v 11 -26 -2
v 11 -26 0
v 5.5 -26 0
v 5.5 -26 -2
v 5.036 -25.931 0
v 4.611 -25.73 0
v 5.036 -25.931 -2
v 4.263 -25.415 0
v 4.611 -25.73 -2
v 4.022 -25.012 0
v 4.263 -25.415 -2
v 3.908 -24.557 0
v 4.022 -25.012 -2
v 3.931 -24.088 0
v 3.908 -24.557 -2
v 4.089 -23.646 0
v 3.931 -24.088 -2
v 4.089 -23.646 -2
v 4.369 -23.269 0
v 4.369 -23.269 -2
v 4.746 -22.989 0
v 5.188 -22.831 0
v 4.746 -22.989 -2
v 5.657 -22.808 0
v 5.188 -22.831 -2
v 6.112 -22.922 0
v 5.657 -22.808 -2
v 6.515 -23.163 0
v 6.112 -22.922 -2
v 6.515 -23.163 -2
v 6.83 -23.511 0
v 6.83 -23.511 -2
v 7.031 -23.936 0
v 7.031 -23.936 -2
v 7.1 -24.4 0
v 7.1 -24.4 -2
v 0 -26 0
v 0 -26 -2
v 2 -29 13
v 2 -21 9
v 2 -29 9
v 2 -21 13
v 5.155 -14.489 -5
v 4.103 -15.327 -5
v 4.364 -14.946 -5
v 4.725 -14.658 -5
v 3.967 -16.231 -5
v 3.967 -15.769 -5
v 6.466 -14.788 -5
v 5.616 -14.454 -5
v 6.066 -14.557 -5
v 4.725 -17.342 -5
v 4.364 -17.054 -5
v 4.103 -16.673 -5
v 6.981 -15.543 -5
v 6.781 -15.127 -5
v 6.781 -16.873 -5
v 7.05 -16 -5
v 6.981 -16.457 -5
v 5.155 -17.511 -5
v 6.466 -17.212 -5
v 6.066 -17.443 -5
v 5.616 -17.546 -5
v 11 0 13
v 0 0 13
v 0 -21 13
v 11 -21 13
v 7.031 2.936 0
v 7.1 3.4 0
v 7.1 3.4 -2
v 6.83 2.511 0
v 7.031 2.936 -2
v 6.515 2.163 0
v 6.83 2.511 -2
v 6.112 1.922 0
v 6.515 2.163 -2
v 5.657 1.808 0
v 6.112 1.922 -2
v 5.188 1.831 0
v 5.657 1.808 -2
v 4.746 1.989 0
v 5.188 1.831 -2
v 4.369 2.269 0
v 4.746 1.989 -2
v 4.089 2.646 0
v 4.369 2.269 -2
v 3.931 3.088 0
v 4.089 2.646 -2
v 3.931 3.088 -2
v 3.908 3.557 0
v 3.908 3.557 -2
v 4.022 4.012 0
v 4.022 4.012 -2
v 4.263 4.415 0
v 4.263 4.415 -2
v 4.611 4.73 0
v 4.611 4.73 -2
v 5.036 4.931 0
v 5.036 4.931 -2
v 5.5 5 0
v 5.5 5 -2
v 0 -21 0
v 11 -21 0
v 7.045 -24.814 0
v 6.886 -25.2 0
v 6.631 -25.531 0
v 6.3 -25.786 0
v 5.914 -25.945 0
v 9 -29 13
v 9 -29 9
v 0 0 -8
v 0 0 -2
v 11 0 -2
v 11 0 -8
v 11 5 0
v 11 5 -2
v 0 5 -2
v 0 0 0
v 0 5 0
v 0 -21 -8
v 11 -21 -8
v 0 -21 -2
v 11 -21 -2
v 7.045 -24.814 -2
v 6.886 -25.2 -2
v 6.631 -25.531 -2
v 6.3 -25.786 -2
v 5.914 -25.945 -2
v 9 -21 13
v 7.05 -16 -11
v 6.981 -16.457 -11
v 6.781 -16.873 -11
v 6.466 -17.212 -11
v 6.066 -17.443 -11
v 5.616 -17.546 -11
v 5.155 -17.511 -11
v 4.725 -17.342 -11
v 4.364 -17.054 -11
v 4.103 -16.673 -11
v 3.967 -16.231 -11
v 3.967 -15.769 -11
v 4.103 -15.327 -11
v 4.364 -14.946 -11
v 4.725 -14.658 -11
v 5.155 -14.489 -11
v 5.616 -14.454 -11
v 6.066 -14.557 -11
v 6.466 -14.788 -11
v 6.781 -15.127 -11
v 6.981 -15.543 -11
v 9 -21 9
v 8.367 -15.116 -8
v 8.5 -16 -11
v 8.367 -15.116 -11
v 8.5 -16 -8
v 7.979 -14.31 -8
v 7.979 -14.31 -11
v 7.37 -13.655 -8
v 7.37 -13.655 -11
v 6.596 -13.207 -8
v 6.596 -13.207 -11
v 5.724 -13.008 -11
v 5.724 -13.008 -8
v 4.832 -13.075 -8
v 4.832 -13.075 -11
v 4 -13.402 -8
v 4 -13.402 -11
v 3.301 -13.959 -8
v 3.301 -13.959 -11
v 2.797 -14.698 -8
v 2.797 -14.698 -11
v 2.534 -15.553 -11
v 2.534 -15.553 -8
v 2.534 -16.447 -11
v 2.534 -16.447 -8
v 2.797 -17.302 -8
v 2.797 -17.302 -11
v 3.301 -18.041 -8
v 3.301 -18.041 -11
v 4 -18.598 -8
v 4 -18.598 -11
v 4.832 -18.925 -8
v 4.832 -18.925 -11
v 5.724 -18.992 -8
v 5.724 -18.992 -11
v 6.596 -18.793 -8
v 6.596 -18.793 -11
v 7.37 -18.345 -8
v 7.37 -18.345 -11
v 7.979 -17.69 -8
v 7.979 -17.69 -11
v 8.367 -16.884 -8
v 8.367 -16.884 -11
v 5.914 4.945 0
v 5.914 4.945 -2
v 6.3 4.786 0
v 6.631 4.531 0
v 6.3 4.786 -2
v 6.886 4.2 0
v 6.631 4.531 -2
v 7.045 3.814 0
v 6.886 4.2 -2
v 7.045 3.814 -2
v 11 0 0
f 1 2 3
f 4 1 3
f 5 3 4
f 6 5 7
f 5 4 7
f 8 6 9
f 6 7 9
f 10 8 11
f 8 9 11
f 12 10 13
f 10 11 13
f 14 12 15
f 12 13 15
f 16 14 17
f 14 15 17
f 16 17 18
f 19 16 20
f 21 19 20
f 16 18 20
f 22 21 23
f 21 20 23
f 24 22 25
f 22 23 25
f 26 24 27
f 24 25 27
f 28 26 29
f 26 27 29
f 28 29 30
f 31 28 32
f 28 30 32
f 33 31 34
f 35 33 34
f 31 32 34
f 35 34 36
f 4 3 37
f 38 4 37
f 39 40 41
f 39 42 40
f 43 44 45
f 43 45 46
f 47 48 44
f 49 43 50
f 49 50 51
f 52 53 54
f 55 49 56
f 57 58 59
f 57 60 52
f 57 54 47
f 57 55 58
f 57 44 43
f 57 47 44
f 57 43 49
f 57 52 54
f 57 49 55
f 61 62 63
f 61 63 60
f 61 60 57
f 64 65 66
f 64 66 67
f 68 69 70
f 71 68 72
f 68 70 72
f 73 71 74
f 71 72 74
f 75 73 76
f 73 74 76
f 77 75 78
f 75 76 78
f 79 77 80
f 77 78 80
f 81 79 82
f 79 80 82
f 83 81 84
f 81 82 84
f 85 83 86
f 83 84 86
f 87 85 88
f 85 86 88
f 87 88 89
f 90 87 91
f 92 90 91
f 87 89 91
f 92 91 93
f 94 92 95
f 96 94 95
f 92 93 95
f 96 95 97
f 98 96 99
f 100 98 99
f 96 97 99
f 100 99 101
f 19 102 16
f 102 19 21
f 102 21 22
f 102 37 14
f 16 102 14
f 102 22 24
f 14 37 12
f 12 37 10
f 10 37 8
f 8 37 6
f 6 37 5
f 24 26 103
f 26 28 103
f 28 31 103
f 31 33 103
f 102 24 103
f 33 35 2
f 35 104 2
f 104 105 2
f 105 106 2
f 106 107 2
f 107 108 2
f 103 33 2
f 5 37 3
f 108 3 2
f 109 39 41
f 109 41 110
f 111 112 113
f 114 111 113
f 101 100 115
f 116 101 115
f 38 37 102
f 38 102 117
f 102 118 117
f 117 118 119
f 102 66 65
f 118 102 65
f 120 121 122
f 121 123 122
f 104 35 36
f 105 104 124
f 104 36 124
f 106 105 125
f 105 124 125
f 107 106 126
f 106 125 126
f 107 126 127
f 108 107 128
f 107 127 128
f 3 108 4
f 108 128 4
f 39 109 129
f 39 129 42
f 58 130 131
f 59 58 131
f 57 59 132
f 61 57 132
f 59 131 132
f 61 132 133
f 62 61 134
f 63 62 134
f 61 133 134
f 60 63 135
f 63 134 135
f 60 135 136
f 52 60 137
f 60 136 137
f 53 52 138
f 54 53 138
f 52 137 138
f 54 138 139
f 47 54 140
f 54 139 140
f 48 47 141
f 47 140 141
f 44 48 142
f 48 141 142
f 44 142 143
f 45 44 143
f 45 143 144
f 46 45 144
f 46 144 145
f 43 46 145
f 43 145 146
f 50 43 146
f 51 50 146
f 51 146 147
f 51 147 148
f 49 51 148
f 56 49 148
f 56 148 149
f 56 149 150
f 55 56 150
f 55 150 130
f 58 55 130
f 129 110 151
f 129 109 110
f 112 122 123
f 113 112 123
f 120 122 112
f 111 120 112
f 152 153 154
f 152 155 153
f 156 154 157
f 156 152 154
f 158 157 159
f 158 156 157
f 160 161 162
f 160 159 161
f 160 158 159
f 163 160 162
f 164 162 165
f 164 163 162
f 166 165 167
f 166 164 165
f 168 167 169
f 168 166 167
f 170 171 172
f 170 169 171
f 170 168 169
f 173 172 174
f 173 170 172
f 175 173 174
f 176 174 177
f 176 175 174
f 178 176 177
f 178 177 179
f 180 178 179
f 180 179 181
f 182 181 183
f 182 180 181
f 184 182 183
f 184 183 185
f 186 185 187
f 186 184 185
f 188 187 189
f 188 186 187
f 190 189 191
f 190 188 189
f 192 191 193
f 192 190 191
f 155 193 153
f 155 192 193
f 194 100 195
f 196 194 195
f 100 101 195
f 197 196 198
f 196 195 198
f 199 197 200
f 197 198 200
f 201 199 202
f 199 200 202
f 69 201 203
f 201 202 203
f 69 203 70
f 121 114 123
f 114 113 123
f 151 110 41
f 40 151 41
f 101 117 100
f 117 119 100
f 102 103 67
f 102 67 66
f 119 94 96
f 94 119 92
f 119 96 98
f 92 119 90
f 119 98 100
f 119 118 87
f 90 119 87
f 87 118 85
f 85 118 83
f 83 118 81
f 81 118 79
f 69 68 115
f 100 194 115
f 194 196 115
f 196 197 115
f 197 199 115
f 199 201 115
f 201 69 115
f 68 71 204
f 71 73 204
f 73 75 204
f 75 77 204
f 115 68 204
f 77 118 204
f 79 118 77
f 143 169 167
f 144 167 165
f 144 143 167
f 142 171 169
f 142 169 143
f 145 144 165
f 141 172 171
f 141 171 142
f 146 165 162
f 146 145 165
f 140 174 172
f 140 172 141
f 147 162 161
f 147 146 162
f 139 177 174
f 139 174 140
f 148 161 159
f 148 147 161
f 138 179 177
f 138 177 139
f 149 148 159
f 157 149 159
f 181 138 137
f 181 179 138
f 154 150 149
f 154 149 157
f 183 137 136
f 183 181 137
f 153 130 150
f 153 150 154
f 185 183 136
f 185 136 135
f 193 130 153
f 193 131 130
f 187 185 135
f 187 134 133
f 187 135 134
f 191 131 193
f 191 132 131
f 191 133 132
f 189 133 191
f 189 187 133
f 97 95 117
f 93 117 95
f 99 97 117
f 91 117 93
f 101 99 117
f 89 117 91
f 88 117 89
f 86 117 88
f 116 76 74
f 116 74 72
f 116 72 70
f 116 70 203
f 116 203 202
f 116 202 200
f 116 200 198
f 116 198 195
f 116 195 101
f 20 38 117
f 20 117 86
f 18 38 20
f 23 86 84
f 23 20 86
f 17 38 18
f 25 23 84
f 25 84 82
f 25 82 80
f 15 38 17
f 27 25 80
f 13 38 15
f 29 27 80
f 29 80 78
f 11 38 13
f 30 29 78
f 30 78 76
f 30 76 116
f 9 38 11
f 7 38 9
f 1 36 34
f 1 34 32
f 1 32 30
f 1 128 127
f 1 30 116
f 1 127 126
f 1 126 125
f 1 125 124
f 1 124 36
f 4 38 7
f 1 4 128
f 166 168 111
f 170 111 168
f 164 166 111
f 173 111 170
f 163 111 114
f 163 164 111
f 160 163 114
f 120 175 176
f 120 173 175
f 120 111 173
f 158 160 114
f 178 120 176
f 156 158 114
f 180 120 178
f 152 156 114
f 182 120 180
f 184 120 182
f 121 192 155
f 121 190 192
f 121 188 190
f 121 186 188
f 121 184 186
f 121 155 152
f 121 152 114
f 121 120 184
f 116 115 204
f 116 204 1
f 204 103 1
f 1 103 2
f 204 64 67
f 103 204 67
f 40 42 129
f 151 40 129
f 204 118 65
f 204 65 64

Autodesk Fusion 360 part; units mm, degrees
sketch "Sketch1" plane through (0, 0, 0) normal (0, 0, 1) x (1, 0, 0)
  line L0 (0, 0) -> (11, 0)
  line L1 (11, 0) -> (11, -21)
  line L2 (11, -21) -> (0, -21)
  line L3 (0, -21) -> (0, 0)
extrude "Extrude1" add sketch "Sketch1" along normal blind 13 makes body 1
sketch "Sketch2" plane through (0, 0, 0) normal (0, 0, -1) x (1, 0, 0)
  line L0 (11, 21) -> (0, 21)
  line L1 (0, 21) -> (0, 0)
  line L2 (0, 0) -> (11, 0)
  line L3 (11, 0) -> (11, 21)
  line L4 (0, -5) -> (11, -5)
  line L5 (11, -5) -> (11, 26)
  line L6 (11, 26) -> (0, 26)
  line L7 (0, 26) -> (0, -5)
  dimension "d3" = 11
extrude "Extrude2" add sketch "Sketch2" along normal blind 2 bodies 1
sketch "Sketch3" plane through (0, 0, -2) normal (0, 0, -1) x (1, 0, 0)
  line L0 (0, 26) -> (0, -5)
  line L1 (0, -5) -> (11, -5)
  line L2 (11, -5) -> (11, 26)
  line L3 (11, 26) -> (0, 26)
  circle A0 centre (5.5, -3.4) radius 1.6
  circle A1 centre (5.5, 24.4) radius 1.6
  dimension "d6" = 3.2
  dimension "d7" = 5.5
  dimension "d8" = 5.5
  dimension "d9" = 1.6
  dimension "d10" = 1.6
  dimension "d11" = 3.2
extrude "Extrude3" cut sketch "Sketch3" against normal blind 2 contours A0 | A1 bodies 1
sketch "Sketch4" plane through (0, 0, -2) normal (0, 0, -1) x (1, 0, 0)
  line L0 (0, 26) -> (0, -5)
  line L1 (0, -5) -> (5.5, -5)
  circle A0 centre (5.5, -3.4) radius 1.6
  line L2 (5.5, -5) -> (11, -5)
  line L3 (11, -5) -> (11, 26)
  line L4 (11, 26) -> (5.5, 26)
  circle A1 centre (5.5, 24.4) radius 1.6
  line L5 (5.5, 26) -> (0, 26)
  line L6 (0, 0) -> (11, 0)
  line L7 (11, 0) -> (11, 21)
  line L8 (11, 21) -> (0, 21)
  line L9 (0, 21) -> (0, 0)
extrude "Extrude4" add sketch "Sketch4" along normal blind 6 separate body contours L0 L3 L6 L7 L8 L9 makes body 2
sketch "Sketch5" plane through (0, 0, -8) normal (0, 0, -1) x (1, 0, 0)
  line L0 (0, 21) -> (0, 0)
  line L1 (0, 0) -> (11, 0)
  line L2 (11, 0) -> (11, 21)
  line L3 (11, 21) -> (0, 21)
  circle A0 centre (5.5, 16) radius 3
  dimension "d16" = 6
  dimension "d17" = 5
extrude "Extrude5" add sketch "Sketch5" along normal blind 3 contours A0 bodies 2
sketch "Sketch6" plane through (0, 0, -11) normal (0, 0, -1) x (1, 0, 0)
  circle A0 centre (5.5, 16) radius 3
  circle A1 centre (5.5, 16) radius 1.55
  dimension "d20" = 3.1
extrude "Extrude6" cut sketch "Sketch6" against normal blind 6 contours A1 bodies 2
sketch "Sketch7" plane through (0, 0, 13) normal (0, 0, 1) x (-1, 0, 0)
  line L0 (0, 21) -> (-11, 21)
  line L1 (-11, 21) -> (-11, 0)
  line L2 (-11, 0) -> (0, 0)
  line L3 (0, 0) -> (0, 21)
  line L4 (-9, 21) -> (-2, 21)
  line L5 (-2, 21) -> (-2, 29)
  line L6 (-2, 29) -> (-9, 29)
  line L7 (-9, 29) -> (-9, 21)
  dimension "d23" = 2
extrude "Extrude7" add sketch "Sketch7" against normal blind 4 separate body contours L0 L4 L5 L6 L7 makes body 3
